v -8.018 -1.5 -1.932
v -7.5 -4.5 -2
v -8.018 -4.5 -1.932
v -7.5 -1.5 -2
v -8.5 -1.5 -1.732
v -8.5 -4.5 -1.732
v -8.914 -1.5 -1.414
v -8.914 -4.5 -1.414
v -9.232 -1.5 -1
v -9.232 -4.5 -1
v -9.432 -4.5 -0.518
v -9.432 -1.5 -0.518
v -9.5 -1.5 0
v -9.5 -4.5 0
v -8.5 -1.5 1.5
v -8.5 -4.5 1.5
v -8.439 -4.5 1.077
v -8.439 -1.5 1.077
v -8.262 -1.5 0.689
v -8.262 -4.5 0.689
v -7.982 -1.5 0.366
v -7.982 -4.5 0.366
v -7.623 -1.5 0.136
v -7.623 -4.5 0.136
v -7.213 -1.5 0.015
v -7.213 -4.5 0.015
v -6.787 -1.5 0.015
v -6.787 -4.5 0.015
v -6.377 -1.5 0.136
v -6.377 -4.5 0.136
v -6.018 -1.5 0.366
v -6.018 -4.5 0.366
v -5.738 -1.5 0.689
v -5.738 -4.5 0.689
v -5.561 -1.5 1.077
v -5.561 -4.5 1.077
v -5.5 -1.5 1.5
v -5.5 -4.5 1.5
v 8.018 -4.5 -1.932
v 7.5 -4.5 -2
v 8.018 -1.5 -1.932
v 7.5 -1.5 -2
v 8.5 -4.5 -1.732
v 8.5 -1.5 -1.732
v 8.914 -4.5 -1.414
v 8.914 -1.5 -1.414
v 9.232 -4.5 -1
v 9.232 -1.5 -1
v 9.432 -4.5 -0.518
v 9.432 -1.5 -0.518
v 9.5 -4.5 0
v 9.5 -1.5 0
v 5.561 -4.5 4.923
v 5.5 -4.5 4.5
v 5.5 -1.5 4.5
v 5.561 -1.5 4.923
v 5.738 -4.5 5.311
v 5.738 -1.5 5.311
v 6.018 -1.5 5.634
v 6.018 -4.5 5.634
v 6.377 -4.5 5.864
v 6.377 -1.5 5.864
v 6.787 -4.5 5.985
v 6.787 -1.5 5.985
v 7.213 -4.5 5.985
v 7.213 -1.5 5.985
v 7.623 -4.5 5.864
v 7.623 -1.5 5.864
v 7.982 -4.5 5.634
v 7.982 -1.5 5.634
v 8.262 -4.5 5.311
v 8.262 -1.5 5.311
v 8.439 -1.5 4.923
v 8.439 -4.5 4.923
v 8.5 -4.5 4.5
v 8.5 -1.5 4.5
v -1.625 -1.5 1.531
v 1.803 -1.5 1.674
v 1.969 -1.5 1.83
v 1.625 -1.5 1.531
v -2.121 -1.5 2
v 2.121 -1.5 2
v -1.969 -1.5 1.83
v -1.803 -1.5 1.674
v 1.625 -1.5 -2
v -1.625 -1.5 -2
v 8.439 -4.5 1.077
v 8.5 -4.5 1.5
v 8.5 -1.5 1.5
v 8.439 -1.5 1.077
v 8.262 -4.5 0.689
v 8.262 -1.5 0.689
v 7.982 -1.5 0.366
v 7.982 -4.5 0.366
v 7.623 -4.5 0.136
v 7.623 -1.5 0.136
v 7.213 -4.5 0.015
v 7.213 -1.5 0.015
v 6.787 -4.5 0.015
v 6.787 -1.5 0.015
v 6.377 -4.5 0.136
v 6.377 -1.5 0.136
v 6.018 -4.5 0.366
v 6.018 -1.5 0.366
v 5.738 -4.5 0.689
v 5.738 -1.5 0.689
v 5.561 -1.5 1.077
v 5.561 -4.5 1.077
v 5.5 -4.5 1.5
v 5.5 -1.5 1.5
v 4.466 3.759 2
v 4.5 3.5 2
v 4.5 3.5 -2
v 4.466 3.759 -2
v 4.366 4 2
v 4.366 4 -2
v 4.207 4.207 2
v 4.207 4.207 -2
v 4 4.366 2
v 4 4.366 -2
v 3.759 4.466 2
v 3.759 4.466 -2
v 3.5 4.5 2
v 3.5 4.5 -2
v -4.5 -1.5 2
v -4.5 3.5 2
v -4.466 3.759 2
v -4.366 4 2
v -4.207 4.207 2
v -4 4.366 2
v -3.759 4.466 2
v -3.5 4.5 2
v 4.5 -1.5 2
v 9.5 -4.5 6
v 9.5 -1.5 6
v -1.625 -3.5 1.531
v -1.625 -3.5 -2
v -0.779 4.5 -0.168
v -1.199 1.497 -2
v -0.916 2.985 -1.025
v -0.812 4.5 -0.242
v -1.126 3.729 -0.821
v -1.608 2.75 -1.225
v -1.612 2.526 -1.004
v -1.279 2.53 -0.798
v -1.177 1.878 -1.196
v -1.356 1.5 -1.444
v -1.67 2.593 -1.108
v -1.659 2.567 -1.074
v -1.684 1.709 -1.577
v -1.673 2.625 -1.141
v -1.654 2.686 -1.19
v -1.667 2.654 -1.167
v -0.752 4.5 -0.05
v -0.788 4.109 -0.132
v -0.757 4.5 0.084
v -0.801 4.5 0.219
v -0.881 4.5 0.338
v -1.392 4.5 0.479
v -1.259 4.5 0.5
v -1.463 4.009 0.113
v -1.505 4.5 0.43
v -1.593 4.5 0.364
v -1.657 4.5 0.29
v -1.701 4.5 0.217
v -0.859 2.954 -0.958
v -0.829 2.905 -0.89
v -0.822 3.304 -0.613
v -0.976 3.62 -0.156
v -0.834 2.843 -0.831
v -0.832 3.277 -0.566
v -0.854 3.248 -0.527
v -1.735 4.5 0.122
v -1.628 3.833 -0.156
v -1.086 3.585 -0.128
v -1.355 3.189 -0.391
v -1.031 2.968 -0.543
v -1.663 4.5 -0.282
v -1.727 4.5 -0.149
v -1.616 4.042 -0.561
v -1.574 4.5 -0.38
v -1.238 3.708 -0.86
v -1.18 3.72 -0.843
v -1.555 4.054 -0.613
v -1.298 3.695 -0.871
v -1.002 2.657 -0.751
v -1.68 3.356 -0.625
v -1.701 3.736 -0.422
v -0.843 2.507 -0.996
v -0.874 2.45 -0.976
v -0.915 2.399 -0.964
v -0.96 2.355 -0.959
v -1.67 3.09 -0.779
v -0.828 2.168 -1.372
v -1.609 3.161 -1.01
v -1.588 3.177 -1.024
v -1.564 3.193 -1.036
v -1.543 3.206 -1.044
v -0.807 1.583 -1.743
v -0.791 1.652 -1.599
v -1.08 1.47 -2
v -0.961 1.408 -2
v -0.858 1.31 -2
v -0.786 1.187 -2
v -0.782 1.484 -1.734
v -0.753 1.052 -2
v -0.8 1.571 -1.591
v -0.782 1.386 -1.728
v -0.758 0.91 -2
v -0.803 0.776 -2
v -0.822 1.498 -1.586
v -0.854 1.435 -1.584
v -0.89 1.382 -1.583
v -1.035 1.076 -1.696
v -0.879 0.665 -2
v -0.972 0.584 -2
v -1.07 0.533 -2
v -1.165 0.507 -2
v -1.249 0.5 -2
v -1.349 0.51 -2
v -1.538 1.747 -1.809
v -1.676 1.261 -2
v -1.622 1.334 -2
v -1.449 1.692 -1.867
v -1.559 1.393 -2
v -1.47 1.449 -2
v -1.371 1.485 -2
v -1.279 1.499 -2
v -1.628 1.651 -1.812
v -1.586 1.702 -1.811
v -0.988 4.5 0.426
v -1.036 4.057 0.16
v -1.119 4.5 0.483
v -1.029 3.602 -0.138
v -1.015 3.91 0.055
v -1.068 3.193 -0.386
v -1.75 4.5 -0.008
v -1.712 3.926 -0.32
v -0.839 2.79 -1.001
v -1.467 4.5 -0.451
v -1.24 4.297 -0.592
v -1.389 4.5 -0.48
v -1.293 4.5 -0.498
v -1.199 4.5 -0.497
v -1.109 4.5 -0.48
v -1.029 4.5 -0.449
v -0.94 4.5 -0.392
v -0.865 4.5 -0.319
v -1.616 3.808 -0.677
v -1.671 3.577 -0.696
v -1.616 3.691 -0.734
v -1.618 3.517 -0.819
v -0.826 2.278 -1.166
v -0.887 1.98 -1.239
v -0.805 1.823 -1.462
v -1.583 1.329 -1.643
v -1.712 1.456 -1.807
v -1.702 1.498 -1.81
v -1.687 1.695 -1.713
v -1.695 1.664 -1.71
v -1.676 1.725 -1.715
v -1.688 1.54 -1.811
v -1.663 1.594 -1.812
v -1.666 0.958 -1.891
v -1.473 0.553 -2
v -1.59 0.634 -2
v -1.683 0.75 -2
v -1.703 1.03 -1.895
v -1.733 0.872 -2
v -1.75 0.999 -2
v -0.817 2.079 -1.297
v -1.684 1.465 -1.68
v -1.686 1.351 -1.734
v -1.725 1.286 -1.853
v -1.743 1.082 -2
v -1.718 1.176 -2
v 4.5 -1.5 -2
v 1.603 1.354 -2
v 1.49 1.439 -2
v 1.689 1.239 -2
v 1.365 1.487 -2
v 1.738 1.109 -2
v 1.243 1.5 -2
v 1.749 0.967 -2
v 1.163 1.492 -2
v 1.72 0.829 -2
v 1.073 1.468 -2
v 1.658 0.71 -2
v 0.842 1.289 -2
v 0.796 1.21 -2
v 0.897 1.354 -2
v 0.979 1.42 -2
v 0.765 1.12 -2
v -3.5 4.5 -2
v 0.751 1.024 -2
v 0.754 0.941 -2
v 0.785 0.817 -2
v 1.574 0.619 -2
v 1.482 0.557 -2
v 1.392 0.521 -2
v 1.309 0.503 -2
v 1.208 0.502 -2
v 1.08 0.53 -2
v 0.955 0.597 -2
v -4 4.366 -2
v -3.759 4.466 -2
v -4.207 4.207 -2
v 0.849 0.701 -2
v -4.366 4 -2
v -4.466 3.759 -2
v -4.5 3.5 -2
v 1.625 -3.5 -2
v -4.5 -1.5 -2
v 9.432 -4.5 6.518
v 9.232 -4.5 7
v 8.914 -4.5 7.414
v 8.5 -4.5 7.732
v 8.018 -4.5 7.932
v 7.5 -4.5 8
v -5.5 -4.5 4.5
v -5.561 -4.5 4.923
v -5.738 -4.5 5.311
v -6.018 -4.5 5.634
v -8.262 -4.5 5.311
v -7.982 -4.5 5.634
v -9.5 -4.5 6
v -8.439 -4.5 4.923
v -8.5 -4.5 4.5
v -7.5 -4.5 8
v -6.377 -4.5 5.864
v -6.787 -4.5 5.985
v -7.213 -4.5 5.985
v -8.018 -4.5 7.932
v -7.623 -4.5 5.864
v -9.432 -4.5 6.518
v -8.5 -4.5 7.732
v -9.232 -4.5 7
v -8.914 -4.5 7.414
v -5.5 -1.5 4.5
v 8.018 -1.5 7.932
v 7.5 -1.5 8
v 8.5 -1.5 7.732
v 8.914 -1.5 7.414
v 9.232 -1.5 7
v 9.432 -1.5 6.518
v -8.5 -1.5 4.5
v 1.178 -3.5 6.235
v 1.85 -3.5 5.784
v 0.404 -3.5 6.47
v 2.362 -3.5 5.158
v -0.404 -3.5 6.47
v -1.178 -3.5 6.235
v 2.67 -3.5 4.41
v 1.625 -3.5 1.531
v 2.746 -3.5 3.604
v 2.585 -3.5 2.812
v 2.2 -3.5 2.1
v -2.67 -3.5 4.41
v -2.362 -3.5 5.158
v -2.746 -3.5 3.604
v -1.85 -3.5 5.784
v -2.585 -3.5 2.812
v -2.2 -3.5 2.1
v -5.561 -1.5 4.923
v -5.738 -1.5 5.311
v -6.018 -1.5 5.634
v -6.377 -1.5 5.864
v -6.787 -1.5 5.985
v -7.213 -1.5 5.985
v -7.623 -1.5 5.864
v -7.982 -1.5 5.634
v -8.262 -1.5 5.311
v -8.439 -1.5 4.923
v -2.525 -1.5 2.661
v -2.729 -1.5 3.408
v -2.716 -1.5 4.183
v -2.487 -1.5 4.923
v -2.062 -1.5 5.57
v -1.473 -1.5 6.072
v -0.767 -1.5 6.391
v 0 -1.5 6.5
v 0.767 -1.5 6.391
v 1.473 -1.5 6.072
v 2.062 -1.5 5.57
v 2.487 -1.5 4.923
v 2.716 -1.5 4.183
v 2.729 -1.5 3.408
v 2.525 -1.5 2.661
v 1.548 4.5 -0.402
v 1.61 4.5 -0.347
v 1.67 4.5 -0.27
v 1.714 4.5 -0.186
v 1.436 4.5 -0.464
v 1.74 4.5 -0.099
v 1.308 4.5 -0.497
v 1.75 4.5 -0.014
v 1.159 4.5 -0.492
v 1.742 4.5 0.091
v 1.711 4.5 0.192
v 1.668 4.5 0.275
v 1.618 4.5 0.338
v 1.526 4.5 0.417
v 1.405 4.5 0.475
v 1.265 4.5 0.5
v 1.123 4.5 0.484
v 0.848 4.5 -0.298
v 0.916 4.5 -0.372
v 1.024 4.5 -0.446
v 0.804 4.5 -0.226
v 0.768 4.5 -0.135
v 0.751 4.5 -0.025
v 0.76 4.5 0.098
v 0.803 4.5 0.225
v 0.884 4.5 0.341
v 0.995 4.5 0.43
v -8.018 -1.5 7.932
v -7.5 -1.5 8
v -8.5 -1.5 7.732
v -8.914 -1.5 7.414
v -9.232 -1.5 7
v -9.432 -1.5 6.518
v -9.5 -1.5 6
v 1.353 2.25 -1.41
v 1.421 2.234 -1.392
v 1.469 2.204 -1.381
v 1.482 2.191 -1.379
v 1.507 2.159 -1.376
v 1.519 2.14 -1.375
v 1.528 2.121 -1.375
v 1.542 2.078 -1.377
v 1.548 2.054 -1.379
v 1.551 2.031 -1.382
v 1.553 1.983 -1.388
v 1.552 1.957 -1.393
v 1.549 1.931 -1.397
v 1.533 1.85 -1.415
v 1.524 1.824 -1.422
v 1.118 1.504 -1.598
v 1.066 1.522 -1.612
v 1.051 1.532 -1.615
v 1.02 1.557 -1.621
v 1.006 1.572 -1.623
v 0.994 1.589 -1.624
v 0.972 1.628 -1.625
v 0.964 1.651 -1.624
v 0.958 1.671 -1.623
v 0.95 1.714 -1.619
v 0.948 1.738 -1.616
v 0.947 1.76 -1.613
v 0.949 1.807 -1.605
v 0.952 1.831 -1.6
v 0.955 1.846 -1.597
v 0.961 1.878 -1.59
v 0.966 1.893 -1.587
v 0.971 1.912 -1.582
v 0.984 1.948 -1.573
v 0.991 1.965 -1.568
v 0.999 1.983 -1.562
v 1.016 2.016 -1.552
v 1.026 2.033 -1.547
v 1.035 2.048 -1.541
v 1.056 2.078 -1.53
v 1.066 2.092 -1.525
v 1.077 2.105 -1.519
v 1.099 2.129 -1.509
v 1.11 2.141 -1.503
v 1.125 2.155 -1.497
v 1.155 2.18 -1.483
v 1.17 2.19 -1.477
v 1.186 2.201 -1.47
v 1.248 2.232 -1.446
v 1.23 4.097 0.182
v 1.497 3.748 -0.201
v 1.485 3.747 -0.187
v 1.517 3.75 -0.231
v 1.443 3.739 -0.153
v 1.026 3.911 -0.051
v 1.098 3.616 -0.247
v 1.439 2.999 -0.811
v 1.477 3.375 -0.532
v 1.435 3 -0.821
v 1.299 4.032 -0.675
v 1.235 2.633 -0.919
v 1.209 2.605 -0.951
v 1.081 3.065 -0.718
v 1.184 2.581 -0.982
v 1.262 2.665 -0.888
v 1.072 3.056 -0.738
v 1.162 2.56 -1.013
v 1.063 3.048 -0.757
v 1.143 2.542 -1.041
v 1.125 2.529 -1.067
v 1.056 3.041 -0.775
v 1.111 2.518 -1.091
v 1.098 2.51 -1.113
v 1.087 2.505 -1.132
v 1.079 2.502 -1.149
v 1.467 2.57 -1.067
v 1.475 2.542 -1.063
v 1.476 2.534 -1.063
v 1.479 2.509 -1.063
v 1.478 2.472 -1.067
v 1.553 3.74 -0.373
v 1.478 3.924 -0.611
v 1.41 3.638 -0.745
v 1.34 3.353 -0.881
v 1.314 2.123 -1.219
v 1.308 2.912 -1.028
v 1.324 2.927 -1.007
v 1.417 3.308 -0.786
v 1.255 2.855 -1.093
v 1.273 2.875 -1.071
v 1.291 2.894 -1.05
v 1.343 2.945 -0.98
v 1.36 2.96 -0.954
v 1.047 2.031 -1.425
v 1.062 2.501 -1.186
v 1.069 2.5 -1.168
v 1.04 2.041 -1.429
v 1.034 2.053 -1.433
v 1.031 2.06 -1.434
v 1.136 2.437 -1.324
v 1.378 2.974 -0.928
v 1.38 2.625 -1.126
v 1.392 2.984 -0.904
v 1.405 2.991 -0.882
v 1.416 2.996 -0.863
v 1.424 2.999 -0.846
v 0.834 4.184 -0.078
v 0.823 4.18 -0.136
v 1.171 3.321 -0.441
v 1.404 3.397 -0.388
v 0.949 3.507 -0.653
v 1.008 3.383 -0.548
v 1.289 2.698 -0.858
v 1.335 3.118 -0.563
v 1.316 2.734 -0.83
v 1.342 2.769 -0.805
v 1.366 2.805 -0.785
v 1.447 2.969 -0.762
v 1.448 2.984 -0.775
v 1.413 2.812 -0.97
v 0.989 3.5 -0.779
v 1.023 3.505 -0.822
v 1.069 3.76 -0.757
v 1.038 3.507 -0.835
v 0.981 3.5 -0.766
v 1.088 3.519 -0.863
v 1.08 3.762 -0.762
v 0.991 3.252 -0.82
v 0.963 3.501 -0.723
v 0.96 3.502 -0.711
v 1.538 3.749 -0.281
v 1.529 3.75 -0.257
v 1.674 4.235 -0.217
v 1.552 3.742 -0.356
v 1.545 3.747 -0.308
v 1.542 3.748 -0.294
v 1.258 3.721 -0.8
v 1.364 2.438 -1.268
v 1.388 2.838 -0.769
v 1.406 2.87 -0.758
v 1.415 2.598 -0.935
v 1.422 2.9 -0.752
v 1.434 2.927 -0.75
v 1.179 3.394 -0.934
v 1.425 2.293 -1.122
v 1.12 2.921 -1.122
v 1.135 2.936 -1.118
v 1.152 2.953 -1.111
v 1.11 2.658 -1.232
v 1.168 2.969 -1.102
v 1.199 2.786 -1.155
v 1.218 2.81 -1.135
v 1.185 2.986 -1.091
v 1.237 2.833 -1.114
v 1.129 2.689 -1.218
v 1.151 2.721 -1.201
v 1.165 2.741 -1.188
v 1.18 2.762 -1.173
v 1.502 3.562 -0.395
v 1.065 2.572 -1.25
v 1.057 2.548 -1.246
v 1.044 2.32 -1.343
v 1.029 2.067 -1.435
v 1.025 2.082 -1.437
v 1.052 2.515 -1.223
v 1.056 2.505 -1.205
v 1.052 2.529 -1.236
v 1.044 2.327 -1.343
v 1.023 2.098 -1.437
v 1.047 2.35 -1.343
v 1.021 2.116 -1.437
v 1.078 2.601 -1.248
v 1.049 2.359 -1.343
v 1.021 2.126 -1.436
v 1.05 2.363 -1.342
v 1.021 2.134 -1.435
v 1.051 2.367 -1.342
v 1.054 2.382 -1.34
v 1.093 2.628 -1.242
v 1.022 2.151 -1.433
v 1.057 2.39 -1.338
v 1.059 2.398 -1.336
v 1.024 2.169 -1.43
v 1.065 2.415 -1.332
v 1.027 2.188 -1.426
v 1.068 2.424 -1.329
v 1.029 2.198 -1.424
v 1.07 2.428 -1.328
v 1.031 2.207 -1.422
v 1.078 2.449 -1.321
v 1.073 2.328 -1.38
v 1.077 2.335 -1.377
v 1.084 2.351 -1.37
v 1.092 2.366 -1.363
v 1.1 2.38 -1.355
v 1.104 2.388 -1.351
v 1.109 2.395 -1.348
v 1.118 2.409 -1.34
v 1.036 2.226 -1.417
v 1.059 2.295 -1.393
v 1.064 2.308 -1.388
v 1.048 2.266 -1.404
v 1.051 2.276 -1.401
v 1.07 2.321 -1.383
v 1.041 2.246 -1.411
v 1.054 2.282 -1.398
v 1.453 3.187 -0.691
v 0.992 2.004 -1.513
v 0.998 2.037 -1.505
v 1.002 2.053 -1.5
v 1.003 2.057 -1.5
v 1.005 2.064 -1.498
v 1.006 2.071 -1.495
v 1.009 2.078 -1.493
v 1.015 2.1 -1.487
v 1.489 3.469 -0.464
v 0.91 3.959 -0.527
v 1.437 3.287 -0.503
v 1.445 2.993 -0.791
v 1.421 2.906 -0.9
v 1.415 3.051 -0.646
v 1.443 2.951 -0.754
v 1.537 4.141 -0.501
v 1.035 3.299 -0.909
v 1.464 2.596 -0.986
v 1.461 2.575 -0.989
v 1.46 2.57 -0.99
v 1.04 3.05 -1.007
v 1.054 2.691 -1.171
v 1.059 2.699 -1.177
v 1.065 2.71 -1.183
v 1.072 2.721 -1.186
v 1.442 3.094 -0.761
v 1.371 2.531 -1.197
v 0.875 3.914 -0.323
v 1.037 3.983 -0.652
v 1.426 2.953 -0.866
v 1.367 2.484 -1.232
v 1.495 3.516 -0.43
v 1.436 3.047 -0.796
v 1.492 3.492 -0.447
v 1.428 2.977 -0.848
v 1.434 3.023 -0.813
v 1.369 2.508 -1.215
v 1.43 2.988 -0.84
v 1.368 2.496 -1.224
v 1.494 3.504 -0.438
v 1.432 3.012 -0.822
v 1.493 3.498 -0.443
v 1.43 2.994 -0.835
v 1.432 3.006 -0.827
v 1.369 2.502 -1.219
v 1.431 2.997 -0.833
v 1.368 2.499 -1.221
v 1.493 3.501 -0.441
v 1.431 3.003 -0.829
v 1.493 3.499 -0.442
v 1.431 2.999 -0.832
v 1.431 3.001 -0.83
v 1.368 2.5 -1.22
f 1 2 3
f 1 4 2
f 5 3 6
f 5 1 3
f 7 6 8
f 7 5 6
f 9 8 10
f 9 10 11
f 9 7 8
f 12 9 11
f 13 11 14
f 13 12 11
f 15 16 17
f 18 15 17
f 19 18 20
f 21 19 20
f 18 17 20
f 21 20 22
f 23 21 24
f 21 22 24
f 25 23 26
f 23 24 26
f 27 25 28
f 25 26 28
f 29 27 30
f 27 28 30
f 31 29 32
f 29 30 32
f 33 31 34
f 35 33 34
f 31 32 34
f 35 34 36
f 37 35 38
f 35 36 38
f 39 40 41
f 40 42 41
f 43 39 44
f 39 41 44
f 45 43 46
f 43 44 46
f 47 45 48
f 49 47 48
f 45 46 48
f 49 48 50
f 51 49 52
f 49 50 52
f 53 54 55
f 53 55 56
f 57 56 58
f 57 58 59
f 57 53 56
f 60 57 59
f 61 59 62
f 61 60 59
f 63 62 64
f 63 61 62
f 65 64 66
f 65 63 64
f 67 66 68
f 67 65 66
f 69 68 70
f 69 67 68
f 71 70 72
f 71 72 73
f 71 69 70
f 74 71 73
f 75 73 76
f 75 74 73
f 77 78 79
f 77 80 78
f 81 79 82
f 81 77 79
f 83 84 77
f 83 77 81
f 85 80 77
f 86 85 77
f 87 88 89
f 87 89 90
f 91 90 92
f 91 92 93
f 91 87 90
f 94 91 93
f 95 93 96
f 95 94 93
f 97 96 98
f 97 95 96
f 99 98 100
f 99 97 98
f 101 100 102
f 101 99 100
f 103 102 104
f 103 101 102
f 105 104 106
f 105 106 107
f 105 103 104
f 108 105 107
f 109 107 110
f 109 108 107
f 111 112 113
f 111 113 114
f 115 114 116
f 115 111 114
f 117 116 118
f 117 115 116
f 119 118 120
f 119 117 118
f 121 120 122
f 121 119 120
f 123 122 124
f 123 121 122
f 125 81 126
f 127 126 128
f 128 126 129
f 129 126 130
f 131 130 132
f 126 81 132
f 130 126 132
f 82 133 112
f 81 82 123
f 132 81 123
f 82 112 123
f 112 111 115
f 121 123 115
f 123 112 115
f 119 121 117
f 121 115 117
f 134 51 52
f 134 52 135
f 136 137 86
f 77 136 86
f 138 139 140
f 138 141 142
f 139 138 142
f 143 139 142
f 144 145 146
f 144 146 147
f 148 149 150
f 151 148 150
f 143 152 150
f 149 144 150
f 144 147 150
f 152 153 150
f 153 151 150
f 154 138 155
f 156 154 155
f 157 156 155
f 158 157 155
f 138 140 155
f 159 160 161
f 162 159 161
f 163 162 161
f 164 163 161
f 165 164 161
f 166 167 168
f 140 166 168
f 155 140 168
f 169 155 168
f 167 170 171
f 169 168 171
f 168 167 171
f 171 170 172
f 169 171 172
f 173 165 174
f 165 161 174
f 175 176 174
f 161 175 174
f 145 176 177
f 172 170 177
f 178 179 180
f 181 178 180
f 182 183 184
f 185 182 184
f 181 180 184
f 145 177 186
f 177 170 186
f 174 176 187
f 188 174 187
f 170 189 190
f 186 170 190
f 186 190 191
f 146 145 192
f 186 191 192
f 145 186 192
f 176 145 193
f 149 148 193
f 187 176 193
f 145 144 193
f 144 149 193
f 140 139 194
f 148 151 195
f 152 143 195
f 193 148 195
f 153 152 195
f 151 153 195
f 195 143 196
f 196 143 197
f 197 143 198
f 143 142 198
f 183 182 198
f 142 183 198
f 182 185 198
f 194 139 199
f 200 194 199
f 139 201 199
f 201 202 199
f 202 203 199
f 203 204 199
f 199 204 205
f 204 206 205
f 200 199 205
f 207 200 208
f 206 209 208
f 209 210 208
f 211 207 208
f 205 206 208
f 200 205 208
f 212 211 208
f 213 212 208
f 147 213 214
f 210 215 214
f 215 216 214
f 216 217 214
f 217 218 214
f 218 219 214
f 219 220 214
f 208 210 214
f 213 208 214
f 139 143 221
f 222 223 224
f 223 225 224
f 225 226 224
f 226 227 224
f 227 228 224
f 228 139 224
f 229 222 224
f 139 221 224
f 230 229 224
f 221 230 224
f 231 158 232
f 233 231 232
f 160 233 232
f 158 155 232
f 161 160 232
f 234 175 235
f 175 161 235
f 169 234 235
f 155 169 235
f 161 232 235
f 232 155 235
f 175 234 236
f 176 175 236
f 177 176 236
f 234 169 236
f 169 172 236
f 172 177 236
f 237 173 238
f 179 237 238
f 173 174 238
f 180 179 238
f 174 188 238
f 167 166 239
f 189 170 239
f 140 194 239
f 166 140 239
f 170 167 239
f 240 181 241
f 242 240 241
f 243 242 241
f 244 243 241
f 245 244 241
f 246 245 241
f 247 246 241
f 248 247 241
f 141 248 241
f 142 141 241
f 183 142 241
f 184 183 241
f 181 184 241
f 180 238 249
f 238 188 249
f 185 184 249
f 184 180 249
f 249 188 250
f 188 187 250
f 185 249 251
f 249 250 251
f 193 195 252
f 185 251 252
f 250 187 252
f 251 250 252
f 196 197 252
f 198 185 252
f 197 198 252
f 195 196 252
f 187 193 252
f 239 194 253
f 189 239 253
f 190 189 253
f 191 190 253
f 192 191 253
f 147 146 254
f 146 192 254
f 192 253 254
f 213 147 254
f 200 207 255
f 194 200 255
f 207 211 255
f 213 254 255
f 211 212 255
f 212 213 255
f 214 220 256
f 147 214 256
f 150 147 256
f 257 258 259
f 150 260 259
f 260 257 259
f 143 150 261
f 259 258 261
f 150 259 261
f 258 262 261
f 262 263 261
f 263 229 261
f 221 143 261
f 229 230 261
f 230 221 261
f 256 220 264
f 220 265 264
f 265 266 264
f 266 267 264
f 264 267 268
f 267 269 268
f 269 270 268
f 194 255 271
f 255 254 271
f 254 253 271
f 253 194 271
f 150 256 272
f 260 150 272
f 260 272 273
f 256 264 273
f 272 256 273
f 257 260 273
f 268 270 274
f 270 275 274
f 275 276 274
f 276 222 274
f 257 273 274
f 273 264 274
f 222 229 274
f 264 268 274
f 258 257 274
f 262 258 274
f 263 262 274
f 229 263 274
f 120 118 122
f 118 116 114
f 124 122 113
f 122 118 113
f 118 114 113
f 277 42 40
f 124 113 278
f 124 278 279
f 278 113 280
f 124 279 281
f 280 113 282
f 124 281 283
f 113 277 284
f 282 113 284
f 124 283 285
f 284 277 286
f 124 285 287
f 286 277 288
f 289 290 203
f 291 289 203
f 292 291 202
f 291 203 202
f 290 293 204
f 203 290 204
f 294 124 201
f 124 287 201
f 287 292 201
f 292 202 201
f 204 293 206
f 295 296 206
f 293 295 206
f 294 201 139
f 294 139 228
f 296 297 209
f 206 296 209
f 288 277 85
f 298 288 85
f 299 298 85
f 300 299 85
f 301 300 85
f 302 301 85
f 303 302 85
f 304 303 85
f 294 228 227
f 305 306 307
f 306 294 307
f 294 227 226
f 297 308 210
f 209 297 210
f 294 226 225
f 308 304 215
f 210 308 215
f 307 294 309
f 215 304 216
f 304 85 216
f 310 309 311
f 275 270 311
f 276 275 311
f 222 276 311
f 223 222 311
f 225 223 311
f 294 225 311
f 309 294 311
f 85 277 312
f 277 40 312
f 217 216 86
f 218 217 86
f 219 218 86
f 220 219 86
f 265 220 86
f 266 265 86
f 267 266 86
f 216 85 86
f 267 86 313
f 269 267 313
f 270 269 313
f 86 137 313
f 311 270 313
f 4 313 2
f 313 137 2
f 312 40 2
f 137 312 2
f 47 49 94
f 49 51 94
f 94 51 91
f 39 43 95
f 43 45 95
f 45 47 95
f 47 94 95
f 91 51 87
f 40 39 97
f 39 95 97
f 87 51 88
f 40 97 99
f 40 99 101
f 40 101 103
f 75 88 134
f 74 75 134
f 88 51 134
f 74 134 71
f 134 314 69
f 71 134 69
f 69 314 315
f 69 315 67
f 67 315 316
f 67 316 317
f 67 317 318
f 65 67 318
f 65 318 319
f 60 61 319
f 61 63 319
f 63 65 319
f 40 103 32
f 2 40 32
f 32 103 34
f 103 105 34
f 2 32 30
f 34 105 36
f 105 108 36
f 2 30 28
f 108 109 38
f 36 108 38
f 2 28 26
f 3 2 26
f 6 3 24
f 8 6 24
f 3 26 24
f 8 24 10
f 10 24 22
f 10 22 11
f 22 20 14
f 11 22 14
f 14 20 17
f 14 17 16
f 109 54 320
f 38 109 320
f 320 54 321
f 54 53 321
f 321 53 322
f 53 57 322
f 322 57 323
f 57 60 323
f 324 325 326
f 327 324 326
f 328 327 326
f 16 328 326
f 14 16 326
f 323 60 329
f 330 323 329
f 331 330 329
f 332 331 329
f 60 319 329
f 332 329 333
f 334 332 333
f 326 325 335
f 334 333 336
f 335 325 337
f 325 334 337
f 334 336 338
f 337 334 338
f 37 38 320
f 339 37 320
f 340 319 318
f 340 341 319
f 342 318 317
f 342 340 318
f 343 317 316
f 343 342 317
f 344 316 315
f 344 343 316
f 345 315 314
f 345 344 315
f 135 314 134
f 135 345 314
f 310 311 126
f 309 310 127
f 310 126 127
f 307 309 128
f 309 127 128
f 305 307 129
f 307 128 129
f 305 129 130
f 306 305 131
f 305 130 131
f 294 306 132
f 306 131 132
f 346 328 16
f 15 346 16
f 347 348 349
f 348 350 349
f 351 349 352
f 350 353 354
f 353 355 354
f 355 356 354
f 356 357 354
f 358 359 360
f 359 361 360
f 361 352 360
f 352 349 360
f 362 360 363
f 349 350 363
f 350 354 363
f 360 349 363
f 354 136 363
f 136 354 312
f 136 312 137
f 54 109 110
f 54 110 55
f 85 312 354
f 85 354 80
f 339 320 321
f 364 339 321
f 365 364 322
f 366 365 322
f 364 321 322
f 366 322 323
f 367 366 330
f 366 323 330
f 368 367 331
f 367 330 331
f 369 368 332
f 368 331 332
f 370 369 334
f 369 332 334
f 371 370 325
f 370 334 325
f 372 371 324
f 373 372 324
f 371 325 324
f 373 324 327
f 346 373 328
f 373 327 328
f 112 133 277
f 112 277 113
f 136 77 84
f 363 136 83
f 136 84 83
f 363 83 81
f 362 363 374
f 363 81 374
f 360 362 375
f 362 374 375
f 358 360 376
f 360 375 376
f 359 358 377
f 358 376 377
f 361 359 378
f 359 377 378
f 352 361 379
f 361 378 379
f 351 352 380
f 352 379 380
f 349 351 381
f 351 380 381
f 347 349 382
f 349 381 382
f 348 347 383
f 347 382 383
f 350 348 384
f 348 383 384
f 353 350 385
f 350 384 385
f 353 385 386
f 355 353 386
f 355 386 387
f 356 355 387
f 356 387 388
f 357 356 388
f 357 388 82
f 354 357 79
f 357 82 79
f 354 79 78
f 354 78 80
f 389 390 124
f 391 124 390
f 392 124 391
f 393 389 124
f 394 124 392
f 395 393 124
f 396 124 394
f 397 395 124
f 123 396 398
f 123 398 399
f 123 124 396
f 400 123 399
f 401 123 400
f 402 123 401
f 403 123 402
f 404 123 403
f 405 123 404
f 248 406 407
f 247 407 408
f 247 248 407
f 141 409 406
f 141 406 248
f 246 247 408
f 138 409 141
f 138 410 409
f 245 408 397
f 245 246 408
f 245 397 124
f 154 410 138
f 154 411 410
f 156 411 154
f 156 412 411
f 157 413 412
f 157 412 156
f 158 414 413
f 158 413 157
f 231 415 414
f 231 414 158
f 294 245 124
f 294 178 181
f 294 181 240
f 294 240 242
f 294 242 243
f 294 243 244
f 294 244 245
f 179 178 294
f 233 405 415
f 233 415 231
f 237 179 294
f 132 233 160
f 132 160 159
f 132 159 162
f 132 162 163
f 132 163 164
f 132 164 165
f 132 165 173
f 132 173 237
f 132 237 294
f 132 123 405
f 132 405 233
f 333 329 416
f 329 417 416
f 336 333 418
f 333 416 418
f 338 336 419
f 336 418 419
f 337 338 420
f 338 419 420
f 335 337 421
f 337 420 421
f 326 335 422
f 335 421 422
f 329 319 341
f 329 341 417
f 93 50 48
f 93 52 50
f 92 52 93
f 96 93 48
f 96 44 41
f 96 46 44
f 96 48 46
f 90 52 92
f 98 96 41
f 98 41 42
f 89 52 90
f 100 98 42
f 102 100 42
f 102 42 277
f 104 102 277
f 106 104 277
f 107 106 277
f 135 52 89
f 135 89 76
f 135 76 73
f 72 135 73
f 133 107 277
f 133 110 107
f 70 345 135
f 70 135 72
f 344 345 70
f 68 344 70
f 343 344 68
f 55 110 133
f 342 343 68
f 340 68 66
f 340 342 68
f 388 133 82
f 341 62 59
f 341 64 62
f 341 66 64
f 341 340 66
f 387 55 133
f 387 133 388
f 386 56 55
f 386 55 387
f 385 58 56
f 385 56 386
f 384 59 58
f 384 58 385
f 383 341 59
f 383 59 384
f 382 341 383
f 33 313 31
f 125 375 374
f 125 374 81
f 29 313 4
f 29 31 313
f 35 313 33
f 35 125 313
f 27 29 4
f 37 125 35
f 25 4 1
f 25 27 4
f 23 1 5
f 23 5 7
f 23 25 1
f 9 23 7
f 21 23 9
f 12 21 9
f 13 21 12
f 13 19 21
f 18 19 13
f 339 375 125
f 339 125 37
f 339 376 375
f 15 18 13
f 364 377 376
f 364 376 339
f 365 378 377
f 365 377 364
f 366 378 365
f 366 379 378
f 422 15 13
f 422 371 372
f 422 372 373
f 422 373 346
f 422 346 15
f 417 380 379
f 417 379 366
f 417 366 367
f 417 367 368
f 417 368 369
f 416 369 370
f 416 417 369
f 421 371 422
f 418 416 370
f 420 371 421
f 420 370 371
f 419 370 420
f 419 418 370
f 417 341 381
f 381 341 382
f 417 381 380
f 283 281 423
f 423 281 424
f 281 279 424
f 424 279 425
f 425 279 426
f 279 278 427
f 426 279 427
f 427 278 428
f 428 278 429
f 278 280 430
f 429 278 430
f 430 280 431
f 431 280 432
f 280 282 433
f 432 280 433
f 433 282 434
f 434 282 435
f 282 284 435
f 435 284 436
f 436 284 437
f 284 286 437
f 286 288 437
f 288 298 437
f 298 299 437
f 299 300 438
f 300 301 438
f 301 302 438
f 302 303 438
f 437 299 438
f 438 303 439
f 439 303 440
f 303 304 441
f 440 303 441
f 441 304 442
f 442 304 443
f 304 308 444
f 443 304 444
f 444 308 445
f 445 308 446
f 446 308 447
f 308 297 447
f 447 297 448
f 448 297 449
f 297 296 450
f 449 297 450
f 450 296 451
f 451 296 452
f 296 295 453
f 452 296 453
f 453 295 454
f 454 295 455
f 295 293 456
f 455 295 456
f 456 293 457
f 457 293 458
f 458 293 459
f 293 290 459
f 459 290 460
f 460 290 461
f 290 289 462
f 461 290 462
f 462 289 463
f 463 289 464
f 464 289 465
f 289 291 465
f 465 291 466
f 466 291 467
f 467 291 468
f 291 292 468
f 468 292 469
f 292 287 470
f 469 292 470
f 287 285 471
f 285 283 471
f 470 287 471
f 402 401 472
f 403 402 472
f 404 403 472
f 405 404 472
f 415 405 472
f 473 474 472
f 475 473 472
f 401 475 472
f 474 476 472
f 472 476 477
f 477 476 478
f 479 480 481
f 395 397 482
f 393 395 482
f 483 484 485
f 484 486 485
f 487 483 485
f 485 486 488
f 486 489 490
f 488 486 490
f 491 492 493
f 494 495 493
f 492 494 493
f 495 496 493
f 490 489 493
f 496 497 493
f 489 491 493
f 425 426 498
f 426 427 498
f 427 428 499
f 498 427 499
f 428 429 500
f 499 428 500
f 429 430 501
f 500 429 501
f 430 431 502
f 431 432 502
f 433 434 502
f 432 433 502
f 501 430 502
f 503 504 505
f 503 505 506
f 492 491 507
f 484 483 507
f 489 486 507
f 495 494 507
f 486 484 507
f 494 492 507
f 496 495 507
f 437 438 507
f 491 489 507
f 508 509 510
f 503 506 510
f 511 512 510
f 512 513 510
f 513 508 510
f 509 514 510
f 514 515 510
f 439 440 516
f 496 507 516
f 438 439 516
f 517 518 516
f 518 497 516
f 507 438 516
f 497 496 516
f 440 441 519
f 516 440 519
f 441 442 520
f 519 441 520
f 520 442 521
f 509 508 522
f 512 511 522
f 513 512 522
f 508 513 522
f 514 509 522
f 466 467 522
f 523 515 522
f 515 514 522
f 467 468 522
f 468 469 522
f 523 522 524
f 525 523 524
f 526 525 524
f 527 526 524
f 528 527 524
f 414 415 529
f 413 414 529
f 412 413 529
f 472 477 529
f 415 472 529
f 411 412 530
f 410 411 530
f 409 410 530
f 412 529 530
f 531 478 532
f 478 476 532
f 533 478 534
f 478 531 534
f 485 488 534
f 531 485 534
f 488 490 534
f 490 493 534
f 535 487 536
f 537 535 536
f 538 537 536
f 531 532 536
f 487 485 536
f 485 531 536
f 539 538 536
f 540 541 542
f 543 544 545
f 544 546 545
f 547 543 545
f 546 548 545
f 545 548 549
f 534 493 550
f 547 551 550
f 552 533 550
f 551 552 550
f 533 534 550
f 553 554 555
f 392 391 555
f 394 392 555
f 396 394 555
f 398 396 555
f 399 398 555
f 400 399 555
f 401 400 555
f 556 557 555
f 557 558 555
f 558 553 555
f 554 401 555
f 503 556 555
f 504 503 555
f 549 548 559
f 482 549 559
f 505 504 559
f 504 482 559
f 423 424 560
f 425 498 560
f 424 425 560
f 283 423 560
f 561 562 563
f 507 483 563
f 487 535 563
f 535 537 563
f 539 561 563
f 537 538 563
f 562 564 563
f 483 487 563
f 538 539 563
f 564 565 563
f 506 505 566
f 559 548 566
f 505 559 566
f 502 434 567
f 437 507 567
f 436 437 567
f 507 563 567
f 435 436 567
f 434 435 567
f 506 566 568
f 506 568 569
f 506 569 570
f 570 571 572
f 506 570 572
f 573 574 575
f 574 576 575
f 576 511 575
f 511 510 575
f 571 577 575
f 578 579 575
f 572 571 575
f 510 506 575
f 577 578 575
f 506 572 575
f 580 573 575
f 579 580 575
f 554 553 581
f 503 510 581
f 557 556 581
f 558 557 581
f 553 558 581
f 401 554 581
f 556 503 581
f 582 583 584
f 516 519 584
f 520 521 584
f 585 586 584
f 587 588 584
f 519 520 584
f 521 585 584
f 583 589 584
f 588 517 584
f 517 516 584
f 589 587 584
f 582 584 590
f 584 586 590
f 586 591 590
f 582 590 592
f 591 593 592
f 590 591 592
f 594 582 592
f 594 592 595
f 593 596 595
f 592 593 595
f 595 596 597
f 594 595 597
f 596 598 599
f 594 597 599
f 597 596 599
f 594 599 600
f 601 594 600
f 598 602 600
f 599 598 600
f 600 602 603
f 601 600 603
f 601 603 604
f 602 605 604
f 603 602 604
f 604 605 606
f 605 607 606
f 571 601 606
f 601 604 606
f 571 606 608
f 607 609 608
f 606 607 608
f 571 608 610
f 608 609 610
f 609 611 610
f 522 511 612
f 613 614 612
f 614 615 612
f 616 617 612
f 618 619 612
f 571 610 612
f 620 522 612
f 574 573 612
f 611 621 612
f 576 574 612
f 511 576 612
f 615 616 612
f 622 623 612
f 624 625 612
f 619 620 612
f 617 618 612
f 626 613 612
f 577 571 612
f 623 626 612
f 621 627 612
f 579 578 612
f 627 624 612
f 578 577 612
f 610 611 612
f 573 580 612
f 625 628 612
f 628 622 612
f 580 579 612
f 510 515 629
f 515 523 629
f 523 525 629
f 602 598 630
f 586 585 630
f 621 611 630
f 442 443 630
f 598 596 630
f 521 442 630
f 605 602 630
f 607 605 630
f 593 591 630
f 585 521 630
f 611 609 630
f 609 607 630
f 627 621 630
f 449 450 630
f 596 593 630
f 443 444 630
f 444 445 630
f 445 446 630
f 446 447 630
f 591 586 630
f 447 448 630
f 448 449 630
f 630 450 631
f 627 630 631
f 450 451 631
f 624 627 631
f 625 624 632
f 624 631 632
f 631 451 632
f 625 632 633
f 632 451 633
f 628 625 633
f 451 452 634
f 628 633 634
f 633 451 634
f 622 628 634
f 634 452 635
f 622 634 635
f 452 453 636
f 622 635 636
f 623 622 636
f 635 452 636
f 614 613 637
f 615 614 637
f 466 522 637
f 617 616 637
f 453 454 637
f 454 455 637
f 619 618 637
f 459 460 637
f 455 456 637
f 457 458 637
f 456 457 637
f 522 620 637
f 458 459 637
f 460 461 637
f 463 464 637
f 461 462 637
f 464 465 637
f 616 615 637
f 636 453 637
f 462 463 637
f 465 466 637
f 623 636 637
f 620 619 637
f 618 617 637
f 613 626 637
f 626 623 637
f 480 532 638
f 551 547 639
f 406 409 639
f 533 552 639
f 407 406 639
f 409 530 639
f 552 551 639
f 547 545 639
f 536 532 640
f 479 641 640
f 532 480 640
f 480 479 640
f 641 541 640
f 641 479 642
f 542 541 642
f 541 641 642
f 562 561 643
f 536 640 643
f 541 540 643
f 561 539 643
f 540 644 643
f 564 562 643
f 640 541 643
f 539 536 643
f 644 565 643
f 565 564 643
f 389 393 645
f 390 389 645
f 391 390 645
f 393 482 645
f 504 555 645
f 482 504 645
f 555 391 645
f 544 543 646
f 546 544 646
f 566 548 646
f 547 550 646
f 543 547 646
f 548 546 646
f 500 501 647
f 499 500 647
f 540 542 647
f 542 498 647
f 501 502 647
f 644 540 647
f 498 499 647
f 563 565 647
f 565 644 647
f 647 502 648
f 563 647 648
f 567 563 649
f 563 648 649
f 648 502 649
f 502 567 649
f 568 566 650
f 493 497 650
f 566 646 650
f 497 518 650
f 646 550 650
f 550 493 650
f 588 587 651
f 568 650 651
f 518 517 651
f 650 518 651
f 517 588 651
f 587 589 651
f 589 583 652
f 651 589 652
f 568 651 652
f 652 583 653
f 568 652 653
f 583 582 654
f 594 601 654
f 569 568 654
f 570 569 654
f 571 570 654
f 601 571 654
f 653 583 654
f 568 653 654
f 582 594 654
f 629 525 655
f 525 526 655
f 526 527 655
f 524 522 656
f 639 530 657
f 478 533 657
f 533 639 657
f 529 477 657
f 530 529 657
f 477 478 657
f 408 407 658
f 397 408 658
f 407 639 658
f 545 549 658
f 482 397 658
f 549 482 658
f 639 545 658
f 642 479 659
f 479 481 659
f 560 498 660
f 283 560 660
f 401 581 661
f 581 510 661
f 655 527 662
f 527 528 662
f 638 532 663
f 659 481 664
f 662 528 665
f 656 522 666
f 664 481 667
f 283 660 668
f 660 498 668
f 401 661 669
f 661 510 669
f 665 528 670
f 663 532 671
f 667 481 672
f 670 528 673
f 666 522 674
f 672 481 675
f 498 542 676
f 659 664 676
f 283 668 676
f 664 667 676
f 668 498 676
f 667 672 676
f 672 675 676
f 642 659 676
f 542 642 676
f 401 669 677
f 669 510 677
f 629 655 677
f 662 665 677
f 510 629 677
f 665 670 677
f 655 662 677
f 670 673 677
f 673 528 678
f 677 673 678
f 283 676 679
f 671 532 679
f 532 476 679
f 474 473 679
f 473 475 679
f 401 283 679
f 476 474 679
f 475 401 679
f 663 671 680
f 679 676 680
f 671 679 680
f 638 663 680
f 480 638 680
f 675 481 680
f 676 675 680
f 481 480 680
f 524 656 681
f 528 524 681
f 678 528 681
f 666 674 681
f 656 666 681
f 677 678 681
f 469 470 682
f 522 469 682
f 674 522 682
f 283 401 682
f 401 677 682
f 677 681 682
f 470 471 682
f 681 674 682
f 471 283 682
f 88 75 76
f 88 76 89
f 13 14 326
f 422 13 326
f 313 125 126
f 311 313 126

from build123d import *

# Parameters (mm, degrees)
SKETCH1_W            = 9
SKETCH1_H            = 9
BOSS_EXTRUDE1_DEPTH  = 8
SKETCH3_W            = 9
SKETCH3_H            = 9
BOSS_EXTRUDE2_DEPTH  = 2
SKETCH5_W            = 5
SKETCH5_H            = 10
BOSS_EXTRUDE3_DEPTH  = 3
FILLET1_R            = 2
FILLET1_OF_MIRROR2_R = 2
FILLET2_R            = 1
SKETCH6_W            = 3.25
SKETCH6_H            = 2
CUT_EXTRUDE1_DEPTH   = 5.75
SKETCH7_W            = 6
SKETCH7_H            = 6
CUT_EXTRUDE2_DEPTH   = 17.740669043
SKETCH8_R            = 2.75
CUT_EXTRUDE3_DEPTH   = 2


with BuildPart() as part:
    # Sketch1 → Boss-Extrude1 (new body)
    with BuildSketch(Plane.XY):
        Rectangle(SKETCH1_W, SKETCH1_H)
    extrude(amount=BOSS_EXTRUDE1_DEPTH)

    # Sketch3 → Boss-Extrude2 (add)
    with BuildSketch(Plane(origin=(0, 0, 0), x_dir=(-1, 0, 0), z_dir=(0, 0, -1))):
        Rectangle(SKETCH3_W, SKETCH3_H)
    extrude(amount=BOSS_EXTRUDE2_DEPTH)

    # Sketch5 → Boss-Extrude3 (add)
    with BuildSketch(Plane.XZ.offset(4.5)):
        with Locations((7, 3)):
            Rectangle(SKETCH5_W, SKETCH5_H)
        with BuildLine():
            Line((8.5, 4.5), (8.5, 1.5))
            ThreePointArc((8.5, 1.5), (7, 0), (5.5, 1.5))
            Line((5.5, 1.5), (5.5, 4.5))
            ThreePointArc((5.5, 4.5), (7, 6), (8.5, 4.5))
        make_face(mode=Mode.SUBTRACT)
    boss_extrude3 = extrude(amount=-BOSS_EXTRUDE3_DEPTH)

    # Fillet1
    fillet1_edges = [part.edges().sort_by_distance(p)[0] for p in [
        (9.5, -3, -2),
        (9.5, -3, 8),
    ]]
    fillet(fillet1_edges, radius=FILLET1_R)

    # Mirror2: Boss-Extrude3 across plane
    add(boss_extrude3.mirror(Plane(origin=(0, 0, 0), x_dir=(0, 0, 1), z_dir=(1, 0, 0))))

    # Fillet1 of Mirror2
    fillet1_of_mirror2_edges = [part.edges().sort_by_distance(p)[0] for p in [
        (-9.5, -3, -2),
        (-9.5, -3, 8),
    ]]
    fillet(fillet1_of_mirror2_edges, radius=FILLET1_OF_MIRROR2_R)

    # Fillet2
    fillet2_edges = [part.edges().sort_by_distance(p)[0] for p in [
        (4.5, 4.5, 3),
        (-4.5, 4.5, 3),
    ]]
    fillet(fillet2_edges, radius=FILLET2_R)

    # Sketch6 → Cut-Extrude1 (cut)
    with BuildSketch(Plane(origin=(0, 0, -2), x_dir=(-1, 0, 0), z_dir=(0, 0, -1))):
        with Locations((0, -2.5)):
            Rectangle(SKETCH6_W, SKETCH6_H)
    extrude(amount=-CUT_EXTRUDE1_DEPTH, mode=Mode.SUBTRACT)

    # Sketch7 → Cut-Extrude2 (cut, through all)
    with BuildSketch(Plane(origin=(4.5, 0, 0), x_dir=(0, 0, -1), z_dir=(1, 0, 0))):
        with Locations((-5, 1.5)):
            Rectangle(SKETCH7_W, SKETCH7_H)
    extrude(amount=-CUT_EXTRUDE2_DEPTH, mode=Mode.SUBTRACT)

    # Sketch8 → Cut-Extrude3 (cut)
    with BuildSketch(Plane(origin=(0, -1.5, 0), x_dir=(1, 0, 0), z_dir=(0, 1, 0))):
        with Locations((0, -3.75)):
            Circle(SKETCH8_R)
    extrude(amount=-CUT_EXTRUDE3_DEPTH, mode=Mode.SUBTRACT)

    # Cut-Loft1: read off the stored shape, not the designer's step
    # Cut-Loft1: loft between two sections, ruled curve by curve
    cut_loft1_from = [
        Edge.make_bspline([(1.618331944, 4.5, 0.33812953), (1.590154483, 4.5, 0.368823859), (1.554547709, 4.5, 0.400118904), (1.463297086, 4.5, 0.455355682), (1.407321542, 4.5, 0.479264412), (1.276254131, 4.5, 0.503741169), (1.200923259, 4.5, 0.503729048), (1.049042928, 4.5, 0.464508058), (0.973259127, 4.5, 0.424686865), (0.850481812, 4.5, 0.311977022), (0.804337969, 4.5, 0.23986837), (0.752297501, 4.5, 0.09188962), (0.745856132, 4.5, 0.016834645), (0.759057321, 4.5, -0.115843561), (0.778101449, 4.5, -0.173655412), (0.825348682, 4.5, -0.269287398), (0.853490596, 4.5, -0.307435202), (0.909845517, 4.5, -0.368823859), (0.945452291, 4.5, -0.400118904), (1.036702914, 4.5, -0.455355682), (1.092678458, 4.5, -0.479264412), (1.223745869, 4.5, -0.503741169), (1.299076741, 4.5, -0.503729048), (1.450957072, 4.5, -0.464508058), (1.526740873, 4.5, -0.424686865), (1.649518188, 4.5, -0.311977022), (1.695662031, 4.5, -0.23986837), (1.747702499, 4.5, -0.09188962), (1.754143868, 4.5, -0.016834645), (1.740942679, 4.5, 0.115843561), (1.721898551, 4.5, 0.173655412), (1.674651318, 4.5, 0.269287398), (1.646509404, 4.5, 0.307435202), (1.618331944, 4.5, 0.33812953)], [0, 0, 0, 0, 0.0625, 0.0625, 0.125, 0.125, 0.1875, 0.1875, 0.25, 0.25, 0.3125, 0.3125, 0.375, 0.375, 0.4375, 0.4375, 0.5, 0.5, 0.5625, 0.5625, 0.625, 0.625, 0.6875, 0.6875, 0.75, 0.75, 0.8125, 0.8125, 0.875, 0.875, 0.9375, 0.9375, 1, 1, 1, 1], 3),
    ]
    cut_loft1_to = [
        Edge.make_bspline([(1.243402847, 1.499956476, -2), (1.285065886, 1.500506238, -2), (1.332261968, 1.496061904, -2), (1.435047124, 1.467548935, -2), (1.4908397, 1.443216294, -2), (1.598552626, 1.364630651, -2), (1.650214755, 1.309805794, -2), (1.725852293, 1.172383512, -2), (1.74885695, 1.089923232, -2), (1.751056001, 0.923271074, -2), (1.730235177, 0.840232497, -2), (1.658250042, 0.700862267, -2), (1.608052526, 0.644693326, -2), (1.502450689, 0.563292897, -2), (1.447319588, 0.537496568, -2), (1.345322572, 0.506281404, -2), (1.298260193, 0.500593287, -2), (1.214934114, 0.499493762, -2), (1.167738032, 0.503938096, -2), (1.064952876, 0.532451065, -2), (1.0091603, 0.556783706, -2), (0.901447374, 0.635369349, -2), (0.849785245, 0.690194206, -2), (0.774147707, 0.827616488, -2), (0.75114305, 0.910076768, -2), (0.748943999, 1.076728926, -2), (0.769764823, 1.159767503, -2), (0.841749958, 1.299137733, -2), (0.891947474, 1.355306674, -2), (0.997549311, 1.436707103, -2), (1.052680412, 1.462503432, -2), (1.154677428, 1.493718596, -2), (1.201739807, 1.499406713, -2), (1.243402847, 1.499956476, -2)], [0, 0, 0, 0, 0.0625, 0.0625, 0.125, 0.125, 0.1875, 0.1875, 0.25, 0.25, 0.3125, 0.3125, 0.375, 0.375, 0.4375, 0.4375, 0.5, 0.5, 0.5625, 0.5625, 0.625, 0.625, 0.6875, 0.6875, 0.75, 0.75, 0.8125, 0.8125, 0.875, 0.875, 0.9375, 0.9375, 1, 1, 1, 1], 3),
    ]
    cut_loft1 = Solid(Shell([*[Face.make_surface_from_curves(cut_loft1_from[k], cut_loft1_to[k]) for k in range(1)], Face(Wire(cut_loft1_from)), Face(Wire(cut_loft1_to))]))
    add(cut_loft1, mode=Mode.SUBTRACT)

    # Cut-Loft2: read off the stored shape, not the designer's step
    # Cut-Loft2: loft between two sections, ruled curve by curve
    cut_loft2_from = [
        Edge.make_bspline([(-0.779241198, 4.5, -0.168481901), (-0.76520104, 4.5, -0.129252), (-0.754089169, 4.5, -0.083167854), (-0.747704068, 4.5, 0.023307534), (-0.752614517, 4.5, 0.083976936), (-0.79199312, 4.5, 0.211362585), (-0.827085975, 4.5, 0.278020157), (-0.932525917, 4.5, 0.394159468), (-1.003058299, 4.5, 0.442678485), (-1.1599779, 4.5, 0.498839118), (-1.245279169, 4.5, 0.506092081), (-1.400466938, 4.5, 0.483229946), (-1.469885794, 4.5, 0.453976521), (-1.581150008, 4.5, 0.380505081), (-1.623440974, 4.5, 0.336728797), (-1.68606606, 4.5, 0.25038138), (-1.706718643, 4.5, 0.207711801), (-1.73479896, 4.5, 0.129252), (-1.745910831, 4.5, 0.083167854), (-1.752295932, 4.5, -0.023307534), (-1.747385483, 4.5, -0.083976936), (-1.70800688, 4.5, -0.211362585), (-1.672914025, 4.5, -0.278020157), (-1.567474083, 4.5, -0.394159468), (-1.496941701, 4.5, -0.442678485), (-1.3400221, 4.5, -0.498839118), (-1.254720831, 4.5, -0.506092081), (-1.099533062, 4.5, -0.483229946), (-1.030114206, 4.5, -0.453976521), (-0.918849992, 4.5, -0.380505081), (-0.876559026, 4.5, -0.336728797), (-0.81393394, 4.5, -0.25038138), (-0.793281357, 4.5, -0.207711801), (-0.779241198, 4.5, -0.168481901)], [0, 0, 0, 0, 0.0625, 0.0625, 0.125, 0.125, 0.1875, 0.1875, 0.25, 0.25, 0.3125, 0.3125, 0.375, 0.375, 0.4375, 0.4375, 0.5, 0.5, 0.5625, 0.5625, 0.625, 0.625, 0.6875, 0.6875, 0.75, 0.75, 0.8125, 0.8125, 0.875, 0.875, 0.9375, 0.9375, 1, 1, 1, 1], 3),
    ]
    cut_loft2_to = [
        Edge.make_bspline([(-1.19856901, 1.497347819, -2), (-1.157123358, 1.493061903, -2), (-1.110761205, 1.483173884, -2), (-1.011976516, 1.442932574, -2), (-0.959382471, 1.412293459, -2), (-0.861510562, 1.321745864, -2), (-0.816555497, 1.261299336, -2), (-0.757366243, 1.116032158, -2), (-0.744080349, 1.031460313, -2), (-0.761224012, 0.865677707, -2), (-0.791534928, 0.78561423, -2), (-0.879198087, 0.655533134, -2), (-0.935571187, 0.605565004, -2), (-1.049901014, 0.536961297, -2), (-1.107651872, 0.517733005, -2), (-1.21258085, 0.498557828, -2), (-1.259985338, 0.498366265, -2), (-1.342876642, 0.506938097, -2), (-1.389238795, 0.516826116, -2), (-1.488023484, 0.557067426, -2), (-1.540617529, 0.587706541, -2), (-1.638489438, 0.678254136, -2), (-1.683444503, 0.738700664, -2), (-1.742633757, 0.883967842, -2), (-1.755919651, 0.968539687, -2), (-1.738775988, 1.134322293, -2), (-1.708465072, 1.21438577, -2), (-1.620801913, 1.344466866, -2), (-1.564428813, 1.394434996, -2), (-1.450098986, 1.463038703, -2), (-1.392348128, 1.482266995, -2), (-1.28741915, 1.501442172, -2), (-1.240014662, 1.501633735, -2), (-1.19856901, 1.497347819, -2)], [0, 0, 0, 0, 0.0625, 0.0625, 0.125, 0.125, 0.1875, 0.1875, 0.25, 0.25, 0.3125, 0.3125, 0.375, 0.375, 0.4375, 0.4375, 0.5, 0.5, 0.5625, 0.5625, 0.625, 0.625, 0.6875, 0.6875, 0.75, 0.75, 0.8125, 0.8125, 0.875, 0.875, 0.9375, 0.9375, 1, 1, 1, 1], 3),
    ]
    cut_loft2 = Solid(Shell([*[Face.make_surface_from_curves(cut_loft2_from[k], cut_loft2_to[k]) for k in range(1)], Face(Wire(cut_loft2_from)), Face(Wire(cut_loft2_to))]))
    add(cut_loft2, mode=Mode.SUBTRACT)


solid = part.part
